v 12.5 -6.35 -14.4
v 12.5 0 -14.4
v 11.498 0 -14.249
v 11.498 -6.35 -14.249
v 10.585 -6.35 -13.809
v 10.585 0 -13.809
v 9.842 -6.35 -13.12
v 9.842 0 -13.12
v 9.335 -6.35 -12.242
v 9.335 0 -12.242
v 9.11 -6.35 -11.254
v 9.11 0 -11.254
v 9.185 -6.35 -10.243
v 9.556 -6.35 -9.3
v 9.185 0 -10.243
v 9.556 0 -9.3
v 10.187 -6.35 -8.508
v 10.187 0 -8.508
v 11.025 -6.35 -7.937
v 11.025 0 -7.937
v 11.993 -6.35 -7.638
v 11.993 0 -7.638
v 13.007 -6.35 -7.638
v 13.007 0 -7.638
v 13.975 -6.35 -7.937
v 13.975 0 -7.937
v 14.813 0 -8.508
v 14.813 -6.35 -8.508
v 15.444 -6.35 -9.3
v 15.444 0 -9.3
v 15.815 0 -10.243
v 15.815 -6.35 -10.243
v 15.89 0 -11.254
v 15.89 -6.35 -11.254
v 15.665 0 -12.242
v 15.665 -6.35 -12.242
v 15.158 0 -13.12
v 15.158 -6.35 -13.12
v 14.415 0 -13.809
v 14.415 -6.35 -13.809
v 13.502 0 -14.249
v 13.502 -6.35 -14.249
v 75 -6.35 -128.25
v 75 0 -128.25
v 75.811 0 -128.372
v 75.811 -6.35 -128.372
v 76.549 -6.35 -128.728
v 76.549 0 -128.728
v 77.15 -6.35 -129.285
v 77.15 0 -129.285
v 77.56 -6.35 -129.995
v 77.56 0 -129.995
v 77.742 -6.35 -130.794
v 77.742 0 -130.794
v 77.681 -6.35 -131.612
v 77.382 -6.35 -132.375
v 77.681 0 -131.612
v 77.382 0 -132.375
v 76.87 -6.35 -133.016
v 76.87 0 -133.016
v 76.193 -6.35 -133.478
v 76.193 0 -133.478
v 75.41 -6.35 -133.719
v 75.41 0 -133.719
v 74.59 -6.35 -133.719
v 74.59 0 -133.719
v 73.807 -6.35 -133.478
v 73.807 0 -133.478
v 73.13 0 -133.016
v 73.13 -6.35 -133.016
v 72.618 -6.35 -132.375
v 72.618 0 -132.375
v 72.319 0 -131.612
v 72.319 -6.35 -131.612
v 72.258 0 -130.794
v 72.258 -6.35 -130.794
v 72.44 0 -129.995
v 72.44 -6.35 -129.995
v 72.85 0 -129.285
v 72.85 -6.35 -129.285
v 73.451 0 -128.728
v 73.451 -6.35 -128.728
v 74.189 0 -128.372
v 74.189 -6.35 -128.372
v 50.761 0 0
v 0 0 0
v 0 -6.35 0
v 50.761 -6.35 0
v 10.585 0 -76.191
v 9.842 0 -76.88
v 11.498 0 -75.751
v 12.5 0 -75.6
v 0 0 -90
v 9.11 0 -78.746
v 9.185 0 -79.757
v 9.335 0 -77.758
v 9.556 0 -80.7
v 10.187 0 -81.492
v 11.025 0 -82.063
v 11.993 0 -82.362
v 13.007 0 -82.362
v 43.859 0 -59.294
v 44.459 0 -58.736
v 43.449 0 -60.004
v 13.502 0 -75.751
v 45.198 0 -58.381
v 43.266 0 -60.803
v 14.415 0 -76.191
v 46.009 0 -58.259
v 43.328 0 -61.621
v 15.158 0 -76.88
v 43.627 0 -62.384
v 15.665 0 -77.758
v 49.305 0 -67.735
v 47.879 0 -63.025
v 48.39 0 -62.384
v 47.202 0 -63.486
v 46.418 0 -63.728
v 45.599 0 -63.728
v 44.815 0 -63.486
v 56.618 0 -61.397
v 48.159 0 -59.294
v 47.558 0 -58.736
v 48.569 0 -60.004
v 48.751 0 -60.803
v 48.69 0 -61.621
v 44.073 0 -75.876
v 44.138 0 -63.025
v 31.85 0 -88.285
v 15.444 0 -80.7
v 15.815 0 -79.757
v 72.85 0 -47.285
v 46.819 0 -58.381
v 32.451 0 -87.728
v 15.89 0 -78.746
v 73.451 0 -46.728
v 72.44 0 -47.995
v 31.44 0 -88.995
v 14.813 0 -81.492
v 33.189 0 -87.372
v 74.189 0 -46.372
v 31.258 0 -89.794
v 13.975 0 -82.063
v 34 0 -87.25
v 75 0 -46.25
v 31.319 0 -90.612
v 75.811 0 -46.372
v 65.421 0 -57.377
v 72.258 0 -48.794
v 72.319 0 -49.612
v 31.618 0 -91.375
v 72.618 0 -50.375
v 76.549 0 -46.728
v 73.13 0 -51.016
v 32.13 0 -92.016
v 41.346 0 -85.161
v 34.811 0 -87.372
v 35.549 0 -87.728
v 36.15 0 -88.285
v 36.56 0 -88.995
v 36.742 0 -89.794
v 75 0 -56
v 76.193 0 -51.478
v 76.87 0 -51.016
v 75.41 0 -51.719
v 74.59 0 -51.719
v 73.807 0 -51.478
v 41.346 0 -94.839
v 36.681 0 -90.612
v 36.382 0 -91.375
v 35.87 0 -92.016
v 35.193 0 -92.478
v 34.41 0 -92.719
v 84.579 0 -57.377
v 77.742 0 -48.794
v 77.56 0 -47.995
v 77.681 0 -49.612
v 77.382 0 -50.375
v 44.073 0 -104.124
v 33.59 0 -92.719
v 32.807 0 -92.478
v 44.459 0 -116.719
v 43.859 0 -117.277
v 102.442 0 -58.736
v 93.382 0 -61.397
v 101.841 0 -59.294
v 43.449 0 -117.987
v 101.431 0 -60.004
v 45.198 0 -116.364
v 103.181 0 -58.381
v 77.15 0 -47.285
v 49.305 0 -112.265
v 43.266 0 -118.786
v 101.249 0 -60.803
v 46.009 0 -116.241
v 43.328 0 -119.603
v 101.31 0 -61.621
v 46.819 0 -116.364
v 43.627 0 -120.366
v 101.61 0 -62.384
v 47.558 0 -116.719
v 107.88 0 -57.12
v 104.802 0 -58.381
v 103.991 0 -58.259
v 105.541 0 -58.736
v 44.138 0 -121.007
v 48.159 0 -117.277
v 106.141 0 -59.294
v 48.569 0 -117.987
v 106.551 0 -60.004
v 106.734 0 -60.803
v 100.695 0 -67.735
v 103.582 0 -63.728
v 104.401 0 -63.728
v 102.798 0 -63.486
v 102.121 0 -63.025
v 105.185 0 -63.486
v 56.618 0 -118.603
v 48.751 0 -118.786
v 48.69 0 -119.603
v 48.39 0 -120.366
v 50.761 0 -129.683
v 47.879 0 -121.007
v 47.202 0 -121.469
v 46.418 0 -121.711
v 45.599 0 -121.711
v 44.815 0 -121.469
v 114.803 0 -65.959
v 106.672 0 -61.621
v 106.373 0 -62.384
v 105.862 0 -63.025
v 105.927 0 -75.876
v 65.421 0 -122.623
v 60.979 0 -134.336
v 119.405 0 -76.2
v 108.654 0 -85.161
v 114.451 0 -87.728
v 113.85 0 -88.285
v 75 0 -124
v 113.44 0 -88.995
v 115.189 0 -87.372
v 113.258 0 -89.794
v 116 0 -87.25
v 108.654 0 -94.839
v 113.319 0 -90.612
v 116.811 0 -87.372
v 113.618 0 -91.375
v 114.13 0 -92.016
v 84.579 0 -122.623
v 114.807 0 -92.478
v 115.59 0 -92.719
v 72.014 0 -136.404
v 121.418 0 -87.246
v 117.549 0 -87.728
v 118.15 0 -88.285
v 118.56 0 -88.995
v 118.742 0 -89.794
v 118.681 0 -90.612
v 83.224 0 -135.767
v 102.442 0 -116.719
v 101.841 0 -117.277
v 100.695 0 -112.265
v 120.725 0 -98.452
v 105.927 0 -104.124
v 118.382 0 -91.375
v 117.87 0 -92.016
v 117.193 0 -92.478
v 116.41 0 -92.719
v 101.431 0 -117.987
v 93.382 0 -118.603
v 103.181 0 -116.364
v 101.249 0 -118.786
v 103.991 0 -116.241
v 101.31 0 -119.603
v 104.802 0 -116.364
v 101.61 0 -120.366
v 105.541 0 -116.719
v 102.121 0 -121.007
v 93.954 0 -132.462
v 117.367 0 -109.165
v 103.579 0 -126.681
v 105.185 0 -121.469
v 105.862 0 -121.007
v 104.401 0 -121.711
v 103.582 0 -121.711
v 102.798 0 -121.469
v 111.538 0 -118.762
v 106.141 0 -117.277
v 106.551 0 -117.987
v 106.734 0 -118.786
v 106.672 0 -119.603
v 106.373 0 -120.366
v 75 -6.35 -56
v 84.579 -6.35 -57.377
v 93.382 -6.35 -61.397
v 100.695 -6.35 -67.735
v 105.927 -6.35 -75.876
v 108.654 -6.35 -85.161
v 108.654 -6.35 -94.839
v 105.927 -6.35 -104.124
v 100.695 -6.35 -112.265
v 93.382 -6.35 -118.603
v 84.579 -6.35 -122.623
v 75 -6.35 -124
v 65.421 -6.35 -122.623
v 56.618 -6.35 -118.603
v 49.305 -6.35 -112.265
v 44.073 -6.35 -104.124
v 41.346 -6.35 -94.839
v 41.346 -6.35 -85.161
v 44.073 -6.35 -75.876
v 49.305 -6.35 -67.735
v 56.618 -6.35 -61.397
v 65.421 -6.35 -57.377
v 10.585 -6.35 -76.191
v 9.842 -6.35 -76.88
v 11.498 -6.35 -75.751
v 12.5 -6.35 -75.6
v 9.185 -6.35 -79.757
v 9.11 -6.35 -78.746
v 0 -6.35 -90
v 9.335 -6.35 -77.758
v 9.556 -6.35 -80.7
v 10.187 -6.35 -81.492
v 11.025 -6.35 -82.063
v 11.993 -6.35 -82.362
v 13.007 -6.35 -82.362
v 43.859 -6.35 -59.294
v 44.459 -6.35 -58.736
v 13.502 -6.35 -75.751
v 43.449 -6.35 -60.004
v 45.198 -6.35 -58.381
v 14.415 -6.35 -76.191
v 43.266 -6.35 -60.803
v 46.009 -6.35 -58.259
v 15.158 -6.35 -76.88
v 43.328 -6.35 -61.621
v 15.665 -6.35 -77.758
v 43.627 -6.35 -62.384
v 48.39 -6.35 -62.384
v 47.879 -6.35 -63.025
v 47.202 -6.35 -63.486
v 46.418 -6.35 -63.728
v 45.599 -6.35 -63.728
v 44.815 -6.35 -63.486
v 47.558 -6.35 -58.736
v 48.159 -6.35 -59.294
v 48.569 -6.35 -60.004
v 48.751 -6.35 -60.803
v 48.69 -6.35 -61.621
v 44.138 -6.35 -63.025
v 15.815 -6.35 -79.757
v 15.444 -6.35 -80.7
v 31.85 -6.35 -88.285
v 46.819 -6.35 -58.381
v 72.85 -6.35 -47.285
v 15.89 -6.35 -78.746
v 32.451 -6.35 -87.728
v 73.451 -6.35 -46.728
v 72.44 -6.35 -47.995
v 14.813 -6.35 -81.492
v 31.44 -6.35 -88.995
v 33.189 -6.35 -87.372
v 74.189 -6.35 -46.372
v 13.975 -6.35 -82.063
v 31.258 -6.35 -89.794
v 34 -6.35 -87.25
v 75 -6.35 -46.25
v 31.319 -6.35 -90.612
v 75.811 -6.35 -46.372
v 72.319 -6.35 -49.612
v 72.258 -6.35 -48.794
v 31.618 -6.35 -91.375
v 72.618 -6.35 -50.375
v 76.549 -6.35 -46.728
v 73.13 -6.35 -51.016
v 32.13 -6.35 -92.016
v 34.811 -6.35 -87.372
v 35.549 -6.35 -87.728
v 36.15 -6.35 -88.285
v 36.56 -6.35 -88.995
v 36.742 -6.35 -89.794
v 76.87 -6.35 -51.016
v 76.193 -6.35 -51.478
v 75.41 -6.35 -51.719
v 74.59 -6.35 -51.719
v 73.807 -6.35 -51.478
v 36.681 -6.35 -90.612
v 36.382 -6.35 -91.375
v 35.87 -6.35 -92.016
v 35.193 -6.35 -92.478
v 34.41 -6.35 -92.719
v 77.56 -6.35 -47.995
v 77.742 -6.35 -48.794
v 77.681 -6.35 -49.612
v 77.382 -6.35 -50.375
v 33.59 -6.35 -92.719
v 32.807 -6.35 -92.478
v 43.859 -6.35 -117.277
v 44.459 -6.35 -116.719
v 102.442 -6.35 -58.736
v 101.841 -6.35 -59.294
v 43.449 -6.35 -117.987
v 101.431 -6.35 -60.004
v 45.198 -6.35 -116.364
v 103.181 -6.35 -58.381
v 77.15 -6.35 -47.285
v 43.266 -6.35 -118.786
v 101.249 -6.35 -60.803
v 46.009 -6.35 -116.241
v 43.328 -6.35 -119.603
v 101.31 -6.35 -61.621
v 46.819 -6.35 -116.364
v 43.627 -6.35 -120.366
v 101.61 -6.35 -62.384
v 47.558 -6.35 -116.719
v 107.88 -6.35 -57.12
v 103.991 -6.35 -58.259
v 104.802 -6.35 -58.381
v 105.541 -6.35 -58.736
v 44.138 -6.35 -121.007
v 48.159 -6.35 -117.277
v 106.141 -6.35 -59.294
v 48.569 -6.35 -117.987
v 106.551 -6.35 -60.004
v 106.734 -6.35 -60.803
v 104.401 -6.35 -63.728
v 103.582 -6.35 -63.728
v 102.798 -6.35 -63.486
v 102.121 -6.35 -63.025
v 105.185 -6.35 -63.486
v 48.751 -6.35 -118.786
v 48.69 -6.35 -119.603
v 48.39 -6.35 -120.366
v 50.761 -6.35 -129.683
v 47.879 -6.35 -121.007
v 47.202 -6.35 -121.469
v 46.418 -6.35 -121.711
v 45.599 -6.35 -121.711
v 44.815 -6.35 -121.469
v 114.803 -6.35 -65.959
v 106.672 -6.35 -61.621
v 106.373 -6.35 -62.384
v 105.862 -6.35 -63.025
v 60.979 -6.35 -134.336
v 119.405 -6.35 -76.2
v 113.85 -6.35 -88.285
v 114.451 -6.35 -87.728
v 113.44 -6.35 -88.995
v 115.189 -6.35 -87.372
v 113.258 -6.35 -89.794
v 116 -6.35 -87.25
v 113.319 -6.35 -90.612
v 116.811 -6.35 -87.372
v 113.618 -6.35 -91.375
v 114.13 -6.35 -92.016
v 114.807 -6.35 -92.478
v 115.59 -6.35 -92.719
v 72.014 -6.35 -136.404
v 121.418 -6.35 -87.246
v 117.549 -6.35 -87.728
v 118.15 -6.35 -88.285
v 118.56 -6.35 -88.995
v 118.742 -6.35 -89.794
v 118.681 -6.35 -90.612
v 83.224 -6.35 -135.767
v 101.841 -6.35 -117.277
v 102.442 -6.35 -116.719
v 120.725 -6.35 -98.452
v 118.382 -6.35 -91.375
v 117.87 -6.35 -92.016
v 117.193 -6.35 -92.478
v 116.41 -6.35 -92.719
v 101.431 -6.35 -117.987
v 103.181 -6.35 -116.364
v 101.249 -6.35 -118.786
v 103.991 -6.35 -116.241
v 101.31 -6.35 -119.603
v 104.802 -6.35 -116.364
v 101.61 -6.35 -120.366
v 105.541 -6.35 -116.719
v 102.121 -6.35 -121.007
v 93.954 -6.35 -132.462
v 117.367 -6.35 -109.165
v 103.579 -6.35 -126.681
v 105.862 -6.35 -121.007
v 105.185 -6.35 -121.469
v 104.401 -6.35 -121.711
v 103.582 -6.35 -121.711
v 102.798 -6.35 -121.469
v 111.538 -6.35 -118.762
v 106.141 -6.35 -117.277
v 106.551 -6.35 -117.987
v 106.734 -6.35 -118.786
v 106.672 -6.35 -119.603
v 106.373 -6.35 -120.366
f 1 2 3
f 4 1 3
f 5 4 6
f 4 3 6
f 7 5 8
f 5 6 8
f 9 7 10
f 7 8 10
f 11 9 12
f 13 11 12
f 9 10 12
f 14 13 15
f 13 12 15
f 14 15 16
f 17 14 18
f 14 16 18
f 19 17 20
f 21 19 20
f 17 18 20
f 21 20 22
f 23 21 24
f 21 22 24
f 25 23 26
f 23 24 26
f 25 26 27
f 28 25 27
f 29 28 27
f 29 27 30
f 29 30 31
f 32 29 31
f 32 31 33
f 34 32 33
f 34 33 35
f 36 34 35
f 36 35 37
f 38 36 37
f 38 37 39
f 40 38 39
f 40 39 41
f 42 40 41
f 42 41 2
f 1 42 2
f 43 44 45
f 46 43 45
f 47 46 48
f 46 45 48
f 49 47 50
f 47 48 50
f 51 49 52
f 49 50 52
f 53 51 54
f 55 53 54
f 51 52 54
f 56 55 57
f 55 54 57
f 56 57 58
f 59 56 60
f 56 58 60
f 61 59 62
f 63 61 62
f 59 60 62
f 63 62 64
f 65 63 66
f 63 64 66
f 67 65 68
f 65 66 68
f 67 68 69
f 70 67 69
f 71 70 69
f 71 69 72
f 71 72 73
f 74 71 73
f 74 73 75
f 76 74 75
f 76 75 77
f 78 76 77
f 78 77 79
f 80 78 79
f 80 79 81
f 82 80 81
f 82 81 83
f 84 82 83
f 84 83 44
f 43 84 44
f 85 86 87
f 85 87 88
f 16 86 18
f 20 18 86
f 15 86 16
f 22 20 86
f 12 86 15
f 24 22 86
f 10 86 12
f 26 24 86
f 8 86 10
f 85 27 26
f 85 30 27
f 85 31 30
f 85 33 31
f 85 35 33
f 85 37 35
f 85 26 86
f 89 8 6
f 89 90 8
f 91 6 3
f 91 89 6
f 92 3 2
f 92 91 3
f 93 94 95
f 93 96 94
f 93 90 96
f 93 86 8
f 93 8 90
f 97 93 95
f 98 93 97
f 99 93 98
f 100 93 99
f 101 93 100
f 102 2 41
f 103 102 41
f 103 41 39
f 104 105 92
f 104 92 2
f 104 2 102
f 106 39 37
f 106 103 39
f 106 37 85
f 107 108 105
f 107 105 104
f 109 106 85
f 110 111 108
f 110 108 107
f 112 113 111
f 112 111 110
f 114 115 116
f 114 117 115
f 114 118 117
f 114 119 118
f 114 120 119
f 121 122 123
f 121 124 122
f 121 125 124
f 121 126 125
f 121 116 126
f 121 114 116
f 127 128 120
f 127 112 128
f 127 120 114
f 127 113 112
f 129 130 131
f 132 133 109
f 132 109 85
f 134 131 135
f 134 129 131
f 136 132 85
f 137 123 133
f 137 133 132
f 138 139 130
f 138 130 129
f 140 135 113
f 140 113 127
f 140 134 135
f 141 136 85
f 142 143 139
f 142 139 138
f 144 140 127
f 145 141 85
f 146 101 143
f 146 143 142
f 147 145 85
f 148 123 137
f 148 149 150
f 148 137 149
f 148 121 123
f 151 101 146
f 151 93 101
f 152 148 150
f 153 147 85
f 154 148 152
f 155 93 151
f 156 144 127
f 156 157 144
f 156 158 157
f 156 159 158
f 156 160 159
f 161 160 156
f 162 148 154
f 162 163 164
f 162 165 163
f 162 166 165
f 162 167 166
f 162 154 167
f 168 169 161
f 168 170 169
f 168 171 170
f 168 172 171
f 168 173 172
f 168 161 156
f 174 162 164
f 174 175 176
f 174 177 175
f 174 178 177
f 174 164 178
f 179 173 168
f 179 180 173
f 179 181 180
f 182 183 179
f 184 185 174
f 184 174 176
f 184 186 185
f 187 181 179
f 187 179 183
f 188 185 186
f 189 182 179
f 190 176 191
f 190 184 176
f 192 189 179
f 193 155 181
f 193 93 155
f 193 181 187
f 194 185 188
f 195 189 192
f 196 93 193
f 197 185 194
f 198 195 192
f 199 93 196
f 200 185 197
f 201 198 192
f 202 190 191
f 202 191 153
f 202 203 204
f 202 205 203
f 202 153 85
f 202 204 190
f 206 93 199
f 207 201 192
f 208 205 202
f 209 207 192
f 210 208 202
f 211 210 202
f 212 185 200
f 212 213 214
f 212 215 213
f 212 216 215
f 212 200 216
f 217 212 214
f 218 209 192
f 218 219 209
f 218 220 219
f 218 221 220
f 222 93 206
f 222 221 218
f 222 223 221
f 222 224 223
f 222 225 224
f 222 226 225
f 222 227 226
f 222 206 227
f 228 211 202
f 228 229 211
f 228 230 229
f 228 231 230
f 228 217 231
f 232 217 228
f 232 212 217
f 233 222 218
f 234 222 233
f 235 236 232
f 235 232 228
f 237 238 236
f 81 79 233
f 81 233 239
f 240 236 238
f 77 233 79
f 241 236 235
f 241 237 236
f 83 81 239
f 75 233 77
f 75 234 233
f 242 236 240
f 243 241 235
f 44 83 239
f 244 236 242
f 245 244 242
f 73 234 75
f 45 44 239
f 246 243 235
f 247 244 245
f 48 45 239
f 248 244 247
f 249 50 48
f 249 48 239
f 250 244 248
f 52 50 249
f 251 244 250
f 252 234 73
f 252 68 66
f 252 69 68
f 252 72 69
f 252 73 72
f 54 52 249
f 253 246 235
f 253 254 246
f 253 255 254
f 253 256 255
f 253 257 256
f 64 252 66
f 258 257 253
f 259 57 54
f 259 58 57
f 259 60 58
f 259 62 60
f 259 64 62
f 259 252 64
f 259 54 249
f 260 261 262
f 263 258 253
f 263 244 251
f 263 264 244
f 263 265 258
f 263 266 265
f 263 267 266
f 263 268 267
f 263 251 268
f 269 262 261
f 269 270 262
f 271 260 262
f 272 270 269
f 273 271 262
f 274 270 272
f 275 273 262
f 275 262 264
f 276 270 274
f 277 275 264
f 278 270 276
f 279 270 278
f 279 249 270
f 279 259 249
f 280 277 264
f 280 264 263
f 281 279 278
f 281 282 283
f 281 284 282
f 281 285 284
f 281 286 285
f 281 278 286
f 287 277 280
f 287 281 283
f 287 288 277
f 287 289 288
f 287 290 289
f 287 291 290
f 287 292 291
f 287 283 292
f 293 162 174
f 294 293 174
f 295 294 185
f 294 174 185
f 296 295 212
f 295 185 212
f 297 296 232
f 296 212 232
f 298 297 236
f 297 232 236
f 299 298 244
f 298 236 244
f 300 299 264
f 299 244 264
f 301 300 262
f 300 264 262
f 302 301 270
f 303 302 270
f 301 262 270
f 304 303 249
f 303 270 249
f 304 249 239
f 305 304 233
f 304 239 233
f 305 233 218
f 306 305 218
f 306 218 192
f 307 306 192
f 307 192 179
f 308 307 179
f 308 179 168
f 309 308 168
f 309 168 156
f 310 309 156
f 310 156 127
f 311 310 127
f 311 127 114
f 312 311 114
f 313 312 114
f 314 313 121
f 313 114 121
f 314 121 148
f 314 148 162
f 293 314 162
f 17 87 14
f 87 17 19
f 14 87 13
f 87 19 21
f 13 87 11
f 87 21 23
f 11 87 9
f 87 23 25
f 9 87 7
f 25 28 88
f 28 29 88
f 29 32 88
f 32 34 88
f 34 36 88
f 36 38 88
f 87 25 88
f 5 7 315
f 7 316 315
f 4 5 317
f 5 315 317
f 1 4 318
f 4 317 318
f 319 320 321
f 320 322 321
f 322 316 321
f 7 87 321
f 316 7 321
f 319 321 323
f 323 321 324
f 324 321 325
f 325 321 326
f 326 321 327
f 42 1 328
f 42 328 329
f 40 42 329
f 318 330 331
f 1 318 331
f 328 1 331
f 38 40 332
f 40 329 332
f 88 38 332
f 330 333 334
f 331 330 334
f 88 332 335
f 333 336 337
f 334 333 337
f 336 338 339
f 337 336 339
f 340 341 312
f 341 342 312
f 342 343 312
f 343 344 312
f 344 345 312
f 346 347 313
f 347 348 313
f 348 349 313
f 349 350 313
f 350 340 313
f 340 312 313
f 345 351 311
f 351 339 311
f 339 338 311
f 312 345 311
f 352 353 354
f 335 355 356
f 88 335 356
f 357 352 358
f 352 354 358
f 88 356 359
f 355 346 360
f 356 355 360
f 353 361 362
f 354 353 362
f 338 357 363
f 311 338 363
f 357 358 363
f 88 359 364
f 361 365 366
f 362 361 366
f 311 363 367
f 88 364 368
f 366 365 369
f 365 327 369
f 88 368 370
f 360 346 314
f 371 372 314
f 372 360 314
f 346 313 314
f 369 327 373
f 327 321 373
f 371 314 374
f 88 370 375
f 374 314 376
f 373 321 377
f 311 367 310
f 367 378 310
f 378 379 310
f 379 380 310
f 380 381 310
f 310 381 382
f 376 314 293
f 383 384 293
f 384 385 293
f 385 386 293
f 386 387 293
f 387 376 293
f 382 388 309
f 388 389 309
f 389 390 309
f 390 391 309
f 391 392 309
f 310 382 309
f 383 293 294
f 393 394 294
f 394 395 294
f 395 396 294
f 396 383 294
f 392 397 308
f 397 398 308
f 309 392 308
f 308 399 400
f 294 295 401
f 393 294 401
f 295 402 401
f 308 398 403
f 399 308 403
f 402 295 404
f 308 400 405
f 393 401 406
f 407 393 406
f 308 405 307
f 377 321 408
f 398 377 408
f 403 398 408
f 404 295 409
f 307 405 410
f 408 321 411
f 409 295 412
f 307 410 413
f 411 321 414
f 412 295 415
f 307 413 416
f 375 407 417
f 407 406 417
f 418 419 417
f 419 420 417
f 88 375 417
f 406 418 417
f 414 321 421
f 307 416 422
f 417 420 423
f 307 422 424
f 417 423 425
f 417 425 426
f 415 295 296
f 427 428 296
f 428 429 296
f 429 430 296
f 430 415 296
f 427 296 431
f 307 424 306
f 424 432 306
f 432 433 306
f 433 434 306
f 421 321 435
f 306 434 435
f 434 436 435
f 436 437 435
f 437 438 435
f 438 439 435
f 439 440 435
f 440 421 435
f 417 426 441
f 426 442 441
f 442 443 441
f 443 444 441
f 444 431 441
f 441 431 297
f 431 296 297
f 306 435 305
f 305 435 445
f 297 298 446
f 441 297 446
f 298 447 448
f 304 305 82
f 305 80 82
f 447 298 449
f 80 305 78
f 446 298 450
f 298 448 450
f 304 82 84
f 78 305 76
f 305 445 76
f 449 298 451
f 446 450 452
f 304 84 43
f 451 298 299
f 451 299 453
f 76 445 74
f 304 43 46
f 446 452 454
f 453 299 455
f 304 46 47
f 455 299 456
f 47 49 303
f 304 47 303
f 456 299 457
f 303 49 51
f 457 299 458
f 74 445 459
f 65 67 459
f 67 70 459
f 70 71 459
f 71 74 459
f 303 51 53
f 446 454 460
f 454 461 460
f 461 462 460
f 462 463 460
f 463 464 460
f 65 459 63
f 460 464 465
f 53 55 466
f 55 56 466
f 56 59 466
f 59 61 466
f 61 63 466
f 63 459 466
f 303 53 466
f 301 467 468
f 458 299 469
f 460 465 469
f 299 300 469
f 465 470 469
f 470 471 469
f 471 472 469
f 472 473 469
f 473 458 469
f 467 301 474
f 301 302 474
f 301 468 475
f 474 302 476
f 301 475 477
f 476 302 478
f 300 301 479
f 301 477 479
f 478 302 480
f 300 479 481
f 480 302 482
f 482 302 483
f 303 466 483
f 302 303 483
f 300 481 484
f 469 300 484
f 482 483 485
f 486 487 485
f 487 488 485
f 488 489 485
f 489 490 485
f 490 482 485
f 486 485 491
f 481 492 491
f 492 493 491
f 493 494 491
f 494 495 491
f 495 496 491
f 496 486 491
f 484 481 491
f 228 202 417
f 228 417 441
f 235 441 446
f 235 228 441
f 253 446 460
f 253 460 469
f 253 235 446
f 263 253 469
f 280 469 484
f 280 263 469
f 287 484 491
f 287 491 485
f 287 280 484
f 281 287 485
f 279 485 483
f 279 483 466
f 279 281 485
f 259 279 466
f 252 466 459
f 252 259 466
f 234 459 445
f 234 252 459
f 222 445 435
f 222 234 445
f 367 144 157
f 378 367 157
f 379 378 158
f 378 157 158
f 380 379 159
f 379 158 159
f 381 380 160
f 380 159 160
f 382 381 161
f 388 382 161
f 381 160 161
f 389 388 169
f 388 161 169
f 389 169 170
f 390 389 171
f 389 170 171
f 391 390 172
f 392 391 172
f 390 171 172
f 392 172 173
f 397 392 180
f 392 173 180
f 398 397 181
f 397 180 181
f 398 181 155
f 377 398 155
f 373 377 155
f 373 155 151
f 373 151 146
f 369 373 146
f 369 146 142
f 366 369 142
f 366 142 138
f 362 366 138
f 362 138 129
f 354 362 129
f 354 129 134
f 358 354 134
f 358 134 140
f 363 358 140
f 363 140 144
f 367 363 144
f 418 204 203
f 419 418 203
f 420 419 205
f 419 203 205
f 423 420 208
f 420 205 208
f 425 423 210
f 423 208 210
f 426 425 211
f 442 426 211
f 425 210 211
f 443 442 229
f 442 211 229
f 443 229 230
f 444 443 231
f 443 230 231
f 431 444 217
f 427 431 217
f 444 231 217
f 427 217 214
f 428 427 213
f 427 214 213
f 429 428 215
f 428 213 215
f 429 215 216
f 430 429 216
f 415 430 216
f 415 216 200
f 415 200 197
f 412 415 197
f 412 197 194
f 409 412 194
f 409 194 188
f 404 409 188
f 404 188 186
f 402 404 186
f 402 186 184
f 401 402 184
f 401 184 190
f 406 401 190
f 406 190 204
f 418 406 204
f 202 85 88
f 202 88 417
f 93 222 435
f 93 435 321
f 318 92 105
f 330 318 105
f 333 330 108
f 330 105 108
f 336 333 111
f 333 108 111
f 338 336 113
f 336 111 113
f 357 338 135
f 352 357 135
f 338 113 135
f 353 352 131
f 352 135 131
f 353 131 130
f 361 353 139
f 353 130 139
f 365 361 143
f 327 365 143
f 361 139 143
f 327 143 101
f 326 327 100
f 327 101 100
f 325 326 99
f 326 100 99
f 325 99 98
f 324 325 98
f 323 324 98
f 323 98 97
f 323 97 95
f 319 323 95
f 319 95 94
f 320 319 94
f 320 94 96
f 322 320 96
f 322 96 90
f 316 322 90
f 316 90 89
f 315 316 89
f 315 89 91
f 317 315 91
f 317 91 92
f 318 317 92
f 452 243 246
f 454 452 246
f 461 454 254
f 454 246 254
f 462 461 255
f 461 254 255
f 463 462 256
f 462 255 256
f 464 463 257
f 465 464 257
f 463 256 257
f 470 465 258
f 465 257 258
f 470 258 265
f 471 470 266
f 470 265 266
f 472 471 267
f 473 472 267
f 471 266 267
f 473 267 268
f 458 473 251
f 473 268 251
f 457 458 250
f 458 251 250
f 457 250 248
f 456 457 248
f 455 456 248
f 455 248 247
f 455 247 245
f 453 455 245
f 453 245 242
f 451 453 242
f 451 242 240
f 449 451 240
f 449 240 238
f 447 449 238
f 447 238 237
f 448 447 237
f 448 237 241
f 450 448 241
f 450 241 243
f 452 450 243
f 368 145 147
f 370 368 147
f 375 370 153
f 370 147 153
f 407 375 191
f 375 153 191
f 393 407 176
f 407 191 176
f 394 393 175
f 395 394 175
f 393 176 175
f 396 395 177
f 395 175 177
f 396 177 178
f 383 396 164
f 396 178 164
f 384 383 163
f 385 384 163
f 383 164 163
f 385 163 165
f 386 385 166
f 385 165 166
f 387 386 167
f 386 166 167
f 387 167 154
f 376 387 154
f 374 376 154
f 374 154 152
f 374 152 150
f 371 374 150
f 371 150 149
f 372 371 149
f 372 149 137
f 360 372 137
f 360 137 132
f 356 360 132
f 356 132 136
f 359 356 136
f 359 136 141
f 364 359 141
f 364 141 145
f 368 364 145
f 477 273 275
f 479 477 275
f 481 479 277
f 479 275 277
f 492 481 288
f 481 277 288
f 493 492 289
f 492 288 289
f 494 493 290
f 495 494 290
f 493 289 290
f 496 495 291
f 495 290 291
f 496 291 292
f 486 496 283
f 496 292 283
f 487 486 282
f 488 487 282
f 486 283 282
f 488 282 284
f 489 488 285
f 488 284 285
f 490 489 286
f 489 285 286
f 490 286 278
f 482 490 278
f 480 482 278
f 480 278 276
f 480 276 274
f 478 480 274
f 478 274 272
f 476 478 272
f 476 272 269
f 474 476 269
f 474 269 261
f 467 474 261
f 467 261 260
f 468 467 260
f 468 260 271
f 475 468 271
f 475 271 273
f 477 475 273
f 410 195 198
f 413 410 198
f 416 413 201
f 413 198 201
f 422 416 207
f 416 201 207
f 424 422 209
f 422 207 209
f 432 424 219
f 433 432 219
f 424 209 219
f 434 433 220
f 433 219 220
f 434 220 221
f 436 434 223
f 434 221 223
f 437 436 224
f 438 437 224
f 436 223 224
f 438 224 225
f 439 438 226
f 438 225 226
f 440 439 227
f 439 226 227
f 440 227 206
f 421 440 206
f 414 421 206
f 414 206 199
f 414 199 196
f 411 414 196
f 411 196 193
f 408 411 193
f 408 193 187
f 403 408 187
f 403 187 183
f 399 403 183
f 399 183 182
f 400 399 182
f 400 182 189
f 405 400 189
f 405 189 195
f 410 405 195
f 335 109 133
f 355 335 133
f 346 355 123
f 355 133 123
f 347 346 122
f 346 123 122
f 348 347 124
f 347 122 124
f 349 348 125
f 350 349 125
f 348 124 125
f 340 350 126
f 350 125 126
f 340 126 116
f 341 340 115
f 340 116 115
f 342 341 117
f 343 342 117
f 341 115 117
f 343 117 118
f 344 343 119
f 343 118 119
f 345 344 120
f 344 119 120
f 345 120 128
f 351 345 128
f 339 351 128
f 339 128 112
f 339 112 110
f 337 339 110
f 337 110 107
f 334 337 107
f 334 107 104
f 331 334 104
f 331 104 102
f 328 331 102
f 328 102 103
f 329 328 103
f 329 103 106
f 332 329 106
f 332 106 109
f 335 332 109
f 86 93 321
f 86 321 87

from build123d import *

# Parameters (mm, degrees)
BASE_FLANGE1_DEPTH = 6.35
SKETCH8_R          = 3.4
CUT_EXTRUDE1_DEPTH = 183.851914127
SKETCH9_R          = 34
CUT_EXTRUDE2_DEPTH = 183.851914127
SKETCH10_R         = 2.75
CUT_EXTRUDE3_DEPTH = 183.851914127


# Sheet-metal steps are written as plain solids
with BuildPart() as part:
    # Sketch2 → Base-Flange1 (new body)
    with BuildSketch(Plane(origin=(0, 0, 0), x_dir=(1, 0, 0), z_dir=(0, 1, 0))):
        with BuildLine():
            Line((0, 0), (50.76093065, 0))
            Line((50.76093065, 0), (107.880465325, 57.119534675))
            ThreePointArc((107.880465325, 57.119534675), (111.537953618, 118.761570635), (50.76093065, 129.682710556))
            Line((50.76093065, 129.682710556), (0, 90))
            Line((0, 90), (0, 0))
        make_face()
    extrude(amount=-BASE_FLANGE1_DEPTH)

    # Sketch8 → Cut-Extrude1 (cut, through all)
    with BuildSketch(Plane(origin=(0, 0, 0), x_dir=(1, 0, 0), z_dir=(0, 1, 0))):
        with Locations(Location((12.5, 79, 0), (0, 0, 270))):
            Circle(SKETCH8_R)
        with Locations(Location((12.5, 11, 0), (0, 0, 90))):
            Circle(SKETCH8_R)
    extrude(amount=-CUT_EXTRUDE1_DEPTH, mode=Mode.SUBTRACT)

    # Sketch9 → Cut-Extrude2 (cut, through all)
    with BuildSketch(Plane(origin=(0, 0, 0), x_dir=(1, 0, 0), z_dir=(0, 1, 0))):
        with Locations(Location((75, 90, 0), (0, 0, 270))):
            Circle(SKETCH9_R)
    extrude(amount=-CUT_EXTRUDE2_DEPTH, mode=Mode.SUBTRACT)

    # Sketch10 → Cut-Extrude3 (cut, through all)
    with BuildSketch(Plane(origin=(0, 0, 0), x_dir=(1, 0, 0), z_dir=(0, 1, 0))):
        with Locations(Location((75, 131, 0), (0, 0, 270))):
            Circle(SKETCH10_R)
        with Locations(Location((103.991378029, 118.991378029, 0), (0, 0, 270))):
            Circle(SKETCH10_R)
        with Locations(Location((116, 90, 0), (0, 0, 270))):
            Circle(SKETCH10_R)
        with Locations(Location((103.991378029, 61.008621971, 0), (0, 0, 270))):
            Circle(SKETCH10_R)
        with Locations(Location((75, 49, 0), (0, 0, 270))):
            Circle(SKETCH10_R)
        with Locations(Location((46.008621971, 61.008621971, 0), (0, 0, 270))):
            Circle(SKETCH10_R)
        with Locations(Location((34, 90, 0), (0, 0, 270))):
            Circle(SKETCH10_R)
        with Locations(Location((46.008621971, 118.991378029, 0), (0, 0, 270))):
            Circle(SKETCH10_R)
    extrude(amount=-CUT_EXTRUDE3_DEPTH, mode=Mode.SUBTRACT)


solid = part.part
